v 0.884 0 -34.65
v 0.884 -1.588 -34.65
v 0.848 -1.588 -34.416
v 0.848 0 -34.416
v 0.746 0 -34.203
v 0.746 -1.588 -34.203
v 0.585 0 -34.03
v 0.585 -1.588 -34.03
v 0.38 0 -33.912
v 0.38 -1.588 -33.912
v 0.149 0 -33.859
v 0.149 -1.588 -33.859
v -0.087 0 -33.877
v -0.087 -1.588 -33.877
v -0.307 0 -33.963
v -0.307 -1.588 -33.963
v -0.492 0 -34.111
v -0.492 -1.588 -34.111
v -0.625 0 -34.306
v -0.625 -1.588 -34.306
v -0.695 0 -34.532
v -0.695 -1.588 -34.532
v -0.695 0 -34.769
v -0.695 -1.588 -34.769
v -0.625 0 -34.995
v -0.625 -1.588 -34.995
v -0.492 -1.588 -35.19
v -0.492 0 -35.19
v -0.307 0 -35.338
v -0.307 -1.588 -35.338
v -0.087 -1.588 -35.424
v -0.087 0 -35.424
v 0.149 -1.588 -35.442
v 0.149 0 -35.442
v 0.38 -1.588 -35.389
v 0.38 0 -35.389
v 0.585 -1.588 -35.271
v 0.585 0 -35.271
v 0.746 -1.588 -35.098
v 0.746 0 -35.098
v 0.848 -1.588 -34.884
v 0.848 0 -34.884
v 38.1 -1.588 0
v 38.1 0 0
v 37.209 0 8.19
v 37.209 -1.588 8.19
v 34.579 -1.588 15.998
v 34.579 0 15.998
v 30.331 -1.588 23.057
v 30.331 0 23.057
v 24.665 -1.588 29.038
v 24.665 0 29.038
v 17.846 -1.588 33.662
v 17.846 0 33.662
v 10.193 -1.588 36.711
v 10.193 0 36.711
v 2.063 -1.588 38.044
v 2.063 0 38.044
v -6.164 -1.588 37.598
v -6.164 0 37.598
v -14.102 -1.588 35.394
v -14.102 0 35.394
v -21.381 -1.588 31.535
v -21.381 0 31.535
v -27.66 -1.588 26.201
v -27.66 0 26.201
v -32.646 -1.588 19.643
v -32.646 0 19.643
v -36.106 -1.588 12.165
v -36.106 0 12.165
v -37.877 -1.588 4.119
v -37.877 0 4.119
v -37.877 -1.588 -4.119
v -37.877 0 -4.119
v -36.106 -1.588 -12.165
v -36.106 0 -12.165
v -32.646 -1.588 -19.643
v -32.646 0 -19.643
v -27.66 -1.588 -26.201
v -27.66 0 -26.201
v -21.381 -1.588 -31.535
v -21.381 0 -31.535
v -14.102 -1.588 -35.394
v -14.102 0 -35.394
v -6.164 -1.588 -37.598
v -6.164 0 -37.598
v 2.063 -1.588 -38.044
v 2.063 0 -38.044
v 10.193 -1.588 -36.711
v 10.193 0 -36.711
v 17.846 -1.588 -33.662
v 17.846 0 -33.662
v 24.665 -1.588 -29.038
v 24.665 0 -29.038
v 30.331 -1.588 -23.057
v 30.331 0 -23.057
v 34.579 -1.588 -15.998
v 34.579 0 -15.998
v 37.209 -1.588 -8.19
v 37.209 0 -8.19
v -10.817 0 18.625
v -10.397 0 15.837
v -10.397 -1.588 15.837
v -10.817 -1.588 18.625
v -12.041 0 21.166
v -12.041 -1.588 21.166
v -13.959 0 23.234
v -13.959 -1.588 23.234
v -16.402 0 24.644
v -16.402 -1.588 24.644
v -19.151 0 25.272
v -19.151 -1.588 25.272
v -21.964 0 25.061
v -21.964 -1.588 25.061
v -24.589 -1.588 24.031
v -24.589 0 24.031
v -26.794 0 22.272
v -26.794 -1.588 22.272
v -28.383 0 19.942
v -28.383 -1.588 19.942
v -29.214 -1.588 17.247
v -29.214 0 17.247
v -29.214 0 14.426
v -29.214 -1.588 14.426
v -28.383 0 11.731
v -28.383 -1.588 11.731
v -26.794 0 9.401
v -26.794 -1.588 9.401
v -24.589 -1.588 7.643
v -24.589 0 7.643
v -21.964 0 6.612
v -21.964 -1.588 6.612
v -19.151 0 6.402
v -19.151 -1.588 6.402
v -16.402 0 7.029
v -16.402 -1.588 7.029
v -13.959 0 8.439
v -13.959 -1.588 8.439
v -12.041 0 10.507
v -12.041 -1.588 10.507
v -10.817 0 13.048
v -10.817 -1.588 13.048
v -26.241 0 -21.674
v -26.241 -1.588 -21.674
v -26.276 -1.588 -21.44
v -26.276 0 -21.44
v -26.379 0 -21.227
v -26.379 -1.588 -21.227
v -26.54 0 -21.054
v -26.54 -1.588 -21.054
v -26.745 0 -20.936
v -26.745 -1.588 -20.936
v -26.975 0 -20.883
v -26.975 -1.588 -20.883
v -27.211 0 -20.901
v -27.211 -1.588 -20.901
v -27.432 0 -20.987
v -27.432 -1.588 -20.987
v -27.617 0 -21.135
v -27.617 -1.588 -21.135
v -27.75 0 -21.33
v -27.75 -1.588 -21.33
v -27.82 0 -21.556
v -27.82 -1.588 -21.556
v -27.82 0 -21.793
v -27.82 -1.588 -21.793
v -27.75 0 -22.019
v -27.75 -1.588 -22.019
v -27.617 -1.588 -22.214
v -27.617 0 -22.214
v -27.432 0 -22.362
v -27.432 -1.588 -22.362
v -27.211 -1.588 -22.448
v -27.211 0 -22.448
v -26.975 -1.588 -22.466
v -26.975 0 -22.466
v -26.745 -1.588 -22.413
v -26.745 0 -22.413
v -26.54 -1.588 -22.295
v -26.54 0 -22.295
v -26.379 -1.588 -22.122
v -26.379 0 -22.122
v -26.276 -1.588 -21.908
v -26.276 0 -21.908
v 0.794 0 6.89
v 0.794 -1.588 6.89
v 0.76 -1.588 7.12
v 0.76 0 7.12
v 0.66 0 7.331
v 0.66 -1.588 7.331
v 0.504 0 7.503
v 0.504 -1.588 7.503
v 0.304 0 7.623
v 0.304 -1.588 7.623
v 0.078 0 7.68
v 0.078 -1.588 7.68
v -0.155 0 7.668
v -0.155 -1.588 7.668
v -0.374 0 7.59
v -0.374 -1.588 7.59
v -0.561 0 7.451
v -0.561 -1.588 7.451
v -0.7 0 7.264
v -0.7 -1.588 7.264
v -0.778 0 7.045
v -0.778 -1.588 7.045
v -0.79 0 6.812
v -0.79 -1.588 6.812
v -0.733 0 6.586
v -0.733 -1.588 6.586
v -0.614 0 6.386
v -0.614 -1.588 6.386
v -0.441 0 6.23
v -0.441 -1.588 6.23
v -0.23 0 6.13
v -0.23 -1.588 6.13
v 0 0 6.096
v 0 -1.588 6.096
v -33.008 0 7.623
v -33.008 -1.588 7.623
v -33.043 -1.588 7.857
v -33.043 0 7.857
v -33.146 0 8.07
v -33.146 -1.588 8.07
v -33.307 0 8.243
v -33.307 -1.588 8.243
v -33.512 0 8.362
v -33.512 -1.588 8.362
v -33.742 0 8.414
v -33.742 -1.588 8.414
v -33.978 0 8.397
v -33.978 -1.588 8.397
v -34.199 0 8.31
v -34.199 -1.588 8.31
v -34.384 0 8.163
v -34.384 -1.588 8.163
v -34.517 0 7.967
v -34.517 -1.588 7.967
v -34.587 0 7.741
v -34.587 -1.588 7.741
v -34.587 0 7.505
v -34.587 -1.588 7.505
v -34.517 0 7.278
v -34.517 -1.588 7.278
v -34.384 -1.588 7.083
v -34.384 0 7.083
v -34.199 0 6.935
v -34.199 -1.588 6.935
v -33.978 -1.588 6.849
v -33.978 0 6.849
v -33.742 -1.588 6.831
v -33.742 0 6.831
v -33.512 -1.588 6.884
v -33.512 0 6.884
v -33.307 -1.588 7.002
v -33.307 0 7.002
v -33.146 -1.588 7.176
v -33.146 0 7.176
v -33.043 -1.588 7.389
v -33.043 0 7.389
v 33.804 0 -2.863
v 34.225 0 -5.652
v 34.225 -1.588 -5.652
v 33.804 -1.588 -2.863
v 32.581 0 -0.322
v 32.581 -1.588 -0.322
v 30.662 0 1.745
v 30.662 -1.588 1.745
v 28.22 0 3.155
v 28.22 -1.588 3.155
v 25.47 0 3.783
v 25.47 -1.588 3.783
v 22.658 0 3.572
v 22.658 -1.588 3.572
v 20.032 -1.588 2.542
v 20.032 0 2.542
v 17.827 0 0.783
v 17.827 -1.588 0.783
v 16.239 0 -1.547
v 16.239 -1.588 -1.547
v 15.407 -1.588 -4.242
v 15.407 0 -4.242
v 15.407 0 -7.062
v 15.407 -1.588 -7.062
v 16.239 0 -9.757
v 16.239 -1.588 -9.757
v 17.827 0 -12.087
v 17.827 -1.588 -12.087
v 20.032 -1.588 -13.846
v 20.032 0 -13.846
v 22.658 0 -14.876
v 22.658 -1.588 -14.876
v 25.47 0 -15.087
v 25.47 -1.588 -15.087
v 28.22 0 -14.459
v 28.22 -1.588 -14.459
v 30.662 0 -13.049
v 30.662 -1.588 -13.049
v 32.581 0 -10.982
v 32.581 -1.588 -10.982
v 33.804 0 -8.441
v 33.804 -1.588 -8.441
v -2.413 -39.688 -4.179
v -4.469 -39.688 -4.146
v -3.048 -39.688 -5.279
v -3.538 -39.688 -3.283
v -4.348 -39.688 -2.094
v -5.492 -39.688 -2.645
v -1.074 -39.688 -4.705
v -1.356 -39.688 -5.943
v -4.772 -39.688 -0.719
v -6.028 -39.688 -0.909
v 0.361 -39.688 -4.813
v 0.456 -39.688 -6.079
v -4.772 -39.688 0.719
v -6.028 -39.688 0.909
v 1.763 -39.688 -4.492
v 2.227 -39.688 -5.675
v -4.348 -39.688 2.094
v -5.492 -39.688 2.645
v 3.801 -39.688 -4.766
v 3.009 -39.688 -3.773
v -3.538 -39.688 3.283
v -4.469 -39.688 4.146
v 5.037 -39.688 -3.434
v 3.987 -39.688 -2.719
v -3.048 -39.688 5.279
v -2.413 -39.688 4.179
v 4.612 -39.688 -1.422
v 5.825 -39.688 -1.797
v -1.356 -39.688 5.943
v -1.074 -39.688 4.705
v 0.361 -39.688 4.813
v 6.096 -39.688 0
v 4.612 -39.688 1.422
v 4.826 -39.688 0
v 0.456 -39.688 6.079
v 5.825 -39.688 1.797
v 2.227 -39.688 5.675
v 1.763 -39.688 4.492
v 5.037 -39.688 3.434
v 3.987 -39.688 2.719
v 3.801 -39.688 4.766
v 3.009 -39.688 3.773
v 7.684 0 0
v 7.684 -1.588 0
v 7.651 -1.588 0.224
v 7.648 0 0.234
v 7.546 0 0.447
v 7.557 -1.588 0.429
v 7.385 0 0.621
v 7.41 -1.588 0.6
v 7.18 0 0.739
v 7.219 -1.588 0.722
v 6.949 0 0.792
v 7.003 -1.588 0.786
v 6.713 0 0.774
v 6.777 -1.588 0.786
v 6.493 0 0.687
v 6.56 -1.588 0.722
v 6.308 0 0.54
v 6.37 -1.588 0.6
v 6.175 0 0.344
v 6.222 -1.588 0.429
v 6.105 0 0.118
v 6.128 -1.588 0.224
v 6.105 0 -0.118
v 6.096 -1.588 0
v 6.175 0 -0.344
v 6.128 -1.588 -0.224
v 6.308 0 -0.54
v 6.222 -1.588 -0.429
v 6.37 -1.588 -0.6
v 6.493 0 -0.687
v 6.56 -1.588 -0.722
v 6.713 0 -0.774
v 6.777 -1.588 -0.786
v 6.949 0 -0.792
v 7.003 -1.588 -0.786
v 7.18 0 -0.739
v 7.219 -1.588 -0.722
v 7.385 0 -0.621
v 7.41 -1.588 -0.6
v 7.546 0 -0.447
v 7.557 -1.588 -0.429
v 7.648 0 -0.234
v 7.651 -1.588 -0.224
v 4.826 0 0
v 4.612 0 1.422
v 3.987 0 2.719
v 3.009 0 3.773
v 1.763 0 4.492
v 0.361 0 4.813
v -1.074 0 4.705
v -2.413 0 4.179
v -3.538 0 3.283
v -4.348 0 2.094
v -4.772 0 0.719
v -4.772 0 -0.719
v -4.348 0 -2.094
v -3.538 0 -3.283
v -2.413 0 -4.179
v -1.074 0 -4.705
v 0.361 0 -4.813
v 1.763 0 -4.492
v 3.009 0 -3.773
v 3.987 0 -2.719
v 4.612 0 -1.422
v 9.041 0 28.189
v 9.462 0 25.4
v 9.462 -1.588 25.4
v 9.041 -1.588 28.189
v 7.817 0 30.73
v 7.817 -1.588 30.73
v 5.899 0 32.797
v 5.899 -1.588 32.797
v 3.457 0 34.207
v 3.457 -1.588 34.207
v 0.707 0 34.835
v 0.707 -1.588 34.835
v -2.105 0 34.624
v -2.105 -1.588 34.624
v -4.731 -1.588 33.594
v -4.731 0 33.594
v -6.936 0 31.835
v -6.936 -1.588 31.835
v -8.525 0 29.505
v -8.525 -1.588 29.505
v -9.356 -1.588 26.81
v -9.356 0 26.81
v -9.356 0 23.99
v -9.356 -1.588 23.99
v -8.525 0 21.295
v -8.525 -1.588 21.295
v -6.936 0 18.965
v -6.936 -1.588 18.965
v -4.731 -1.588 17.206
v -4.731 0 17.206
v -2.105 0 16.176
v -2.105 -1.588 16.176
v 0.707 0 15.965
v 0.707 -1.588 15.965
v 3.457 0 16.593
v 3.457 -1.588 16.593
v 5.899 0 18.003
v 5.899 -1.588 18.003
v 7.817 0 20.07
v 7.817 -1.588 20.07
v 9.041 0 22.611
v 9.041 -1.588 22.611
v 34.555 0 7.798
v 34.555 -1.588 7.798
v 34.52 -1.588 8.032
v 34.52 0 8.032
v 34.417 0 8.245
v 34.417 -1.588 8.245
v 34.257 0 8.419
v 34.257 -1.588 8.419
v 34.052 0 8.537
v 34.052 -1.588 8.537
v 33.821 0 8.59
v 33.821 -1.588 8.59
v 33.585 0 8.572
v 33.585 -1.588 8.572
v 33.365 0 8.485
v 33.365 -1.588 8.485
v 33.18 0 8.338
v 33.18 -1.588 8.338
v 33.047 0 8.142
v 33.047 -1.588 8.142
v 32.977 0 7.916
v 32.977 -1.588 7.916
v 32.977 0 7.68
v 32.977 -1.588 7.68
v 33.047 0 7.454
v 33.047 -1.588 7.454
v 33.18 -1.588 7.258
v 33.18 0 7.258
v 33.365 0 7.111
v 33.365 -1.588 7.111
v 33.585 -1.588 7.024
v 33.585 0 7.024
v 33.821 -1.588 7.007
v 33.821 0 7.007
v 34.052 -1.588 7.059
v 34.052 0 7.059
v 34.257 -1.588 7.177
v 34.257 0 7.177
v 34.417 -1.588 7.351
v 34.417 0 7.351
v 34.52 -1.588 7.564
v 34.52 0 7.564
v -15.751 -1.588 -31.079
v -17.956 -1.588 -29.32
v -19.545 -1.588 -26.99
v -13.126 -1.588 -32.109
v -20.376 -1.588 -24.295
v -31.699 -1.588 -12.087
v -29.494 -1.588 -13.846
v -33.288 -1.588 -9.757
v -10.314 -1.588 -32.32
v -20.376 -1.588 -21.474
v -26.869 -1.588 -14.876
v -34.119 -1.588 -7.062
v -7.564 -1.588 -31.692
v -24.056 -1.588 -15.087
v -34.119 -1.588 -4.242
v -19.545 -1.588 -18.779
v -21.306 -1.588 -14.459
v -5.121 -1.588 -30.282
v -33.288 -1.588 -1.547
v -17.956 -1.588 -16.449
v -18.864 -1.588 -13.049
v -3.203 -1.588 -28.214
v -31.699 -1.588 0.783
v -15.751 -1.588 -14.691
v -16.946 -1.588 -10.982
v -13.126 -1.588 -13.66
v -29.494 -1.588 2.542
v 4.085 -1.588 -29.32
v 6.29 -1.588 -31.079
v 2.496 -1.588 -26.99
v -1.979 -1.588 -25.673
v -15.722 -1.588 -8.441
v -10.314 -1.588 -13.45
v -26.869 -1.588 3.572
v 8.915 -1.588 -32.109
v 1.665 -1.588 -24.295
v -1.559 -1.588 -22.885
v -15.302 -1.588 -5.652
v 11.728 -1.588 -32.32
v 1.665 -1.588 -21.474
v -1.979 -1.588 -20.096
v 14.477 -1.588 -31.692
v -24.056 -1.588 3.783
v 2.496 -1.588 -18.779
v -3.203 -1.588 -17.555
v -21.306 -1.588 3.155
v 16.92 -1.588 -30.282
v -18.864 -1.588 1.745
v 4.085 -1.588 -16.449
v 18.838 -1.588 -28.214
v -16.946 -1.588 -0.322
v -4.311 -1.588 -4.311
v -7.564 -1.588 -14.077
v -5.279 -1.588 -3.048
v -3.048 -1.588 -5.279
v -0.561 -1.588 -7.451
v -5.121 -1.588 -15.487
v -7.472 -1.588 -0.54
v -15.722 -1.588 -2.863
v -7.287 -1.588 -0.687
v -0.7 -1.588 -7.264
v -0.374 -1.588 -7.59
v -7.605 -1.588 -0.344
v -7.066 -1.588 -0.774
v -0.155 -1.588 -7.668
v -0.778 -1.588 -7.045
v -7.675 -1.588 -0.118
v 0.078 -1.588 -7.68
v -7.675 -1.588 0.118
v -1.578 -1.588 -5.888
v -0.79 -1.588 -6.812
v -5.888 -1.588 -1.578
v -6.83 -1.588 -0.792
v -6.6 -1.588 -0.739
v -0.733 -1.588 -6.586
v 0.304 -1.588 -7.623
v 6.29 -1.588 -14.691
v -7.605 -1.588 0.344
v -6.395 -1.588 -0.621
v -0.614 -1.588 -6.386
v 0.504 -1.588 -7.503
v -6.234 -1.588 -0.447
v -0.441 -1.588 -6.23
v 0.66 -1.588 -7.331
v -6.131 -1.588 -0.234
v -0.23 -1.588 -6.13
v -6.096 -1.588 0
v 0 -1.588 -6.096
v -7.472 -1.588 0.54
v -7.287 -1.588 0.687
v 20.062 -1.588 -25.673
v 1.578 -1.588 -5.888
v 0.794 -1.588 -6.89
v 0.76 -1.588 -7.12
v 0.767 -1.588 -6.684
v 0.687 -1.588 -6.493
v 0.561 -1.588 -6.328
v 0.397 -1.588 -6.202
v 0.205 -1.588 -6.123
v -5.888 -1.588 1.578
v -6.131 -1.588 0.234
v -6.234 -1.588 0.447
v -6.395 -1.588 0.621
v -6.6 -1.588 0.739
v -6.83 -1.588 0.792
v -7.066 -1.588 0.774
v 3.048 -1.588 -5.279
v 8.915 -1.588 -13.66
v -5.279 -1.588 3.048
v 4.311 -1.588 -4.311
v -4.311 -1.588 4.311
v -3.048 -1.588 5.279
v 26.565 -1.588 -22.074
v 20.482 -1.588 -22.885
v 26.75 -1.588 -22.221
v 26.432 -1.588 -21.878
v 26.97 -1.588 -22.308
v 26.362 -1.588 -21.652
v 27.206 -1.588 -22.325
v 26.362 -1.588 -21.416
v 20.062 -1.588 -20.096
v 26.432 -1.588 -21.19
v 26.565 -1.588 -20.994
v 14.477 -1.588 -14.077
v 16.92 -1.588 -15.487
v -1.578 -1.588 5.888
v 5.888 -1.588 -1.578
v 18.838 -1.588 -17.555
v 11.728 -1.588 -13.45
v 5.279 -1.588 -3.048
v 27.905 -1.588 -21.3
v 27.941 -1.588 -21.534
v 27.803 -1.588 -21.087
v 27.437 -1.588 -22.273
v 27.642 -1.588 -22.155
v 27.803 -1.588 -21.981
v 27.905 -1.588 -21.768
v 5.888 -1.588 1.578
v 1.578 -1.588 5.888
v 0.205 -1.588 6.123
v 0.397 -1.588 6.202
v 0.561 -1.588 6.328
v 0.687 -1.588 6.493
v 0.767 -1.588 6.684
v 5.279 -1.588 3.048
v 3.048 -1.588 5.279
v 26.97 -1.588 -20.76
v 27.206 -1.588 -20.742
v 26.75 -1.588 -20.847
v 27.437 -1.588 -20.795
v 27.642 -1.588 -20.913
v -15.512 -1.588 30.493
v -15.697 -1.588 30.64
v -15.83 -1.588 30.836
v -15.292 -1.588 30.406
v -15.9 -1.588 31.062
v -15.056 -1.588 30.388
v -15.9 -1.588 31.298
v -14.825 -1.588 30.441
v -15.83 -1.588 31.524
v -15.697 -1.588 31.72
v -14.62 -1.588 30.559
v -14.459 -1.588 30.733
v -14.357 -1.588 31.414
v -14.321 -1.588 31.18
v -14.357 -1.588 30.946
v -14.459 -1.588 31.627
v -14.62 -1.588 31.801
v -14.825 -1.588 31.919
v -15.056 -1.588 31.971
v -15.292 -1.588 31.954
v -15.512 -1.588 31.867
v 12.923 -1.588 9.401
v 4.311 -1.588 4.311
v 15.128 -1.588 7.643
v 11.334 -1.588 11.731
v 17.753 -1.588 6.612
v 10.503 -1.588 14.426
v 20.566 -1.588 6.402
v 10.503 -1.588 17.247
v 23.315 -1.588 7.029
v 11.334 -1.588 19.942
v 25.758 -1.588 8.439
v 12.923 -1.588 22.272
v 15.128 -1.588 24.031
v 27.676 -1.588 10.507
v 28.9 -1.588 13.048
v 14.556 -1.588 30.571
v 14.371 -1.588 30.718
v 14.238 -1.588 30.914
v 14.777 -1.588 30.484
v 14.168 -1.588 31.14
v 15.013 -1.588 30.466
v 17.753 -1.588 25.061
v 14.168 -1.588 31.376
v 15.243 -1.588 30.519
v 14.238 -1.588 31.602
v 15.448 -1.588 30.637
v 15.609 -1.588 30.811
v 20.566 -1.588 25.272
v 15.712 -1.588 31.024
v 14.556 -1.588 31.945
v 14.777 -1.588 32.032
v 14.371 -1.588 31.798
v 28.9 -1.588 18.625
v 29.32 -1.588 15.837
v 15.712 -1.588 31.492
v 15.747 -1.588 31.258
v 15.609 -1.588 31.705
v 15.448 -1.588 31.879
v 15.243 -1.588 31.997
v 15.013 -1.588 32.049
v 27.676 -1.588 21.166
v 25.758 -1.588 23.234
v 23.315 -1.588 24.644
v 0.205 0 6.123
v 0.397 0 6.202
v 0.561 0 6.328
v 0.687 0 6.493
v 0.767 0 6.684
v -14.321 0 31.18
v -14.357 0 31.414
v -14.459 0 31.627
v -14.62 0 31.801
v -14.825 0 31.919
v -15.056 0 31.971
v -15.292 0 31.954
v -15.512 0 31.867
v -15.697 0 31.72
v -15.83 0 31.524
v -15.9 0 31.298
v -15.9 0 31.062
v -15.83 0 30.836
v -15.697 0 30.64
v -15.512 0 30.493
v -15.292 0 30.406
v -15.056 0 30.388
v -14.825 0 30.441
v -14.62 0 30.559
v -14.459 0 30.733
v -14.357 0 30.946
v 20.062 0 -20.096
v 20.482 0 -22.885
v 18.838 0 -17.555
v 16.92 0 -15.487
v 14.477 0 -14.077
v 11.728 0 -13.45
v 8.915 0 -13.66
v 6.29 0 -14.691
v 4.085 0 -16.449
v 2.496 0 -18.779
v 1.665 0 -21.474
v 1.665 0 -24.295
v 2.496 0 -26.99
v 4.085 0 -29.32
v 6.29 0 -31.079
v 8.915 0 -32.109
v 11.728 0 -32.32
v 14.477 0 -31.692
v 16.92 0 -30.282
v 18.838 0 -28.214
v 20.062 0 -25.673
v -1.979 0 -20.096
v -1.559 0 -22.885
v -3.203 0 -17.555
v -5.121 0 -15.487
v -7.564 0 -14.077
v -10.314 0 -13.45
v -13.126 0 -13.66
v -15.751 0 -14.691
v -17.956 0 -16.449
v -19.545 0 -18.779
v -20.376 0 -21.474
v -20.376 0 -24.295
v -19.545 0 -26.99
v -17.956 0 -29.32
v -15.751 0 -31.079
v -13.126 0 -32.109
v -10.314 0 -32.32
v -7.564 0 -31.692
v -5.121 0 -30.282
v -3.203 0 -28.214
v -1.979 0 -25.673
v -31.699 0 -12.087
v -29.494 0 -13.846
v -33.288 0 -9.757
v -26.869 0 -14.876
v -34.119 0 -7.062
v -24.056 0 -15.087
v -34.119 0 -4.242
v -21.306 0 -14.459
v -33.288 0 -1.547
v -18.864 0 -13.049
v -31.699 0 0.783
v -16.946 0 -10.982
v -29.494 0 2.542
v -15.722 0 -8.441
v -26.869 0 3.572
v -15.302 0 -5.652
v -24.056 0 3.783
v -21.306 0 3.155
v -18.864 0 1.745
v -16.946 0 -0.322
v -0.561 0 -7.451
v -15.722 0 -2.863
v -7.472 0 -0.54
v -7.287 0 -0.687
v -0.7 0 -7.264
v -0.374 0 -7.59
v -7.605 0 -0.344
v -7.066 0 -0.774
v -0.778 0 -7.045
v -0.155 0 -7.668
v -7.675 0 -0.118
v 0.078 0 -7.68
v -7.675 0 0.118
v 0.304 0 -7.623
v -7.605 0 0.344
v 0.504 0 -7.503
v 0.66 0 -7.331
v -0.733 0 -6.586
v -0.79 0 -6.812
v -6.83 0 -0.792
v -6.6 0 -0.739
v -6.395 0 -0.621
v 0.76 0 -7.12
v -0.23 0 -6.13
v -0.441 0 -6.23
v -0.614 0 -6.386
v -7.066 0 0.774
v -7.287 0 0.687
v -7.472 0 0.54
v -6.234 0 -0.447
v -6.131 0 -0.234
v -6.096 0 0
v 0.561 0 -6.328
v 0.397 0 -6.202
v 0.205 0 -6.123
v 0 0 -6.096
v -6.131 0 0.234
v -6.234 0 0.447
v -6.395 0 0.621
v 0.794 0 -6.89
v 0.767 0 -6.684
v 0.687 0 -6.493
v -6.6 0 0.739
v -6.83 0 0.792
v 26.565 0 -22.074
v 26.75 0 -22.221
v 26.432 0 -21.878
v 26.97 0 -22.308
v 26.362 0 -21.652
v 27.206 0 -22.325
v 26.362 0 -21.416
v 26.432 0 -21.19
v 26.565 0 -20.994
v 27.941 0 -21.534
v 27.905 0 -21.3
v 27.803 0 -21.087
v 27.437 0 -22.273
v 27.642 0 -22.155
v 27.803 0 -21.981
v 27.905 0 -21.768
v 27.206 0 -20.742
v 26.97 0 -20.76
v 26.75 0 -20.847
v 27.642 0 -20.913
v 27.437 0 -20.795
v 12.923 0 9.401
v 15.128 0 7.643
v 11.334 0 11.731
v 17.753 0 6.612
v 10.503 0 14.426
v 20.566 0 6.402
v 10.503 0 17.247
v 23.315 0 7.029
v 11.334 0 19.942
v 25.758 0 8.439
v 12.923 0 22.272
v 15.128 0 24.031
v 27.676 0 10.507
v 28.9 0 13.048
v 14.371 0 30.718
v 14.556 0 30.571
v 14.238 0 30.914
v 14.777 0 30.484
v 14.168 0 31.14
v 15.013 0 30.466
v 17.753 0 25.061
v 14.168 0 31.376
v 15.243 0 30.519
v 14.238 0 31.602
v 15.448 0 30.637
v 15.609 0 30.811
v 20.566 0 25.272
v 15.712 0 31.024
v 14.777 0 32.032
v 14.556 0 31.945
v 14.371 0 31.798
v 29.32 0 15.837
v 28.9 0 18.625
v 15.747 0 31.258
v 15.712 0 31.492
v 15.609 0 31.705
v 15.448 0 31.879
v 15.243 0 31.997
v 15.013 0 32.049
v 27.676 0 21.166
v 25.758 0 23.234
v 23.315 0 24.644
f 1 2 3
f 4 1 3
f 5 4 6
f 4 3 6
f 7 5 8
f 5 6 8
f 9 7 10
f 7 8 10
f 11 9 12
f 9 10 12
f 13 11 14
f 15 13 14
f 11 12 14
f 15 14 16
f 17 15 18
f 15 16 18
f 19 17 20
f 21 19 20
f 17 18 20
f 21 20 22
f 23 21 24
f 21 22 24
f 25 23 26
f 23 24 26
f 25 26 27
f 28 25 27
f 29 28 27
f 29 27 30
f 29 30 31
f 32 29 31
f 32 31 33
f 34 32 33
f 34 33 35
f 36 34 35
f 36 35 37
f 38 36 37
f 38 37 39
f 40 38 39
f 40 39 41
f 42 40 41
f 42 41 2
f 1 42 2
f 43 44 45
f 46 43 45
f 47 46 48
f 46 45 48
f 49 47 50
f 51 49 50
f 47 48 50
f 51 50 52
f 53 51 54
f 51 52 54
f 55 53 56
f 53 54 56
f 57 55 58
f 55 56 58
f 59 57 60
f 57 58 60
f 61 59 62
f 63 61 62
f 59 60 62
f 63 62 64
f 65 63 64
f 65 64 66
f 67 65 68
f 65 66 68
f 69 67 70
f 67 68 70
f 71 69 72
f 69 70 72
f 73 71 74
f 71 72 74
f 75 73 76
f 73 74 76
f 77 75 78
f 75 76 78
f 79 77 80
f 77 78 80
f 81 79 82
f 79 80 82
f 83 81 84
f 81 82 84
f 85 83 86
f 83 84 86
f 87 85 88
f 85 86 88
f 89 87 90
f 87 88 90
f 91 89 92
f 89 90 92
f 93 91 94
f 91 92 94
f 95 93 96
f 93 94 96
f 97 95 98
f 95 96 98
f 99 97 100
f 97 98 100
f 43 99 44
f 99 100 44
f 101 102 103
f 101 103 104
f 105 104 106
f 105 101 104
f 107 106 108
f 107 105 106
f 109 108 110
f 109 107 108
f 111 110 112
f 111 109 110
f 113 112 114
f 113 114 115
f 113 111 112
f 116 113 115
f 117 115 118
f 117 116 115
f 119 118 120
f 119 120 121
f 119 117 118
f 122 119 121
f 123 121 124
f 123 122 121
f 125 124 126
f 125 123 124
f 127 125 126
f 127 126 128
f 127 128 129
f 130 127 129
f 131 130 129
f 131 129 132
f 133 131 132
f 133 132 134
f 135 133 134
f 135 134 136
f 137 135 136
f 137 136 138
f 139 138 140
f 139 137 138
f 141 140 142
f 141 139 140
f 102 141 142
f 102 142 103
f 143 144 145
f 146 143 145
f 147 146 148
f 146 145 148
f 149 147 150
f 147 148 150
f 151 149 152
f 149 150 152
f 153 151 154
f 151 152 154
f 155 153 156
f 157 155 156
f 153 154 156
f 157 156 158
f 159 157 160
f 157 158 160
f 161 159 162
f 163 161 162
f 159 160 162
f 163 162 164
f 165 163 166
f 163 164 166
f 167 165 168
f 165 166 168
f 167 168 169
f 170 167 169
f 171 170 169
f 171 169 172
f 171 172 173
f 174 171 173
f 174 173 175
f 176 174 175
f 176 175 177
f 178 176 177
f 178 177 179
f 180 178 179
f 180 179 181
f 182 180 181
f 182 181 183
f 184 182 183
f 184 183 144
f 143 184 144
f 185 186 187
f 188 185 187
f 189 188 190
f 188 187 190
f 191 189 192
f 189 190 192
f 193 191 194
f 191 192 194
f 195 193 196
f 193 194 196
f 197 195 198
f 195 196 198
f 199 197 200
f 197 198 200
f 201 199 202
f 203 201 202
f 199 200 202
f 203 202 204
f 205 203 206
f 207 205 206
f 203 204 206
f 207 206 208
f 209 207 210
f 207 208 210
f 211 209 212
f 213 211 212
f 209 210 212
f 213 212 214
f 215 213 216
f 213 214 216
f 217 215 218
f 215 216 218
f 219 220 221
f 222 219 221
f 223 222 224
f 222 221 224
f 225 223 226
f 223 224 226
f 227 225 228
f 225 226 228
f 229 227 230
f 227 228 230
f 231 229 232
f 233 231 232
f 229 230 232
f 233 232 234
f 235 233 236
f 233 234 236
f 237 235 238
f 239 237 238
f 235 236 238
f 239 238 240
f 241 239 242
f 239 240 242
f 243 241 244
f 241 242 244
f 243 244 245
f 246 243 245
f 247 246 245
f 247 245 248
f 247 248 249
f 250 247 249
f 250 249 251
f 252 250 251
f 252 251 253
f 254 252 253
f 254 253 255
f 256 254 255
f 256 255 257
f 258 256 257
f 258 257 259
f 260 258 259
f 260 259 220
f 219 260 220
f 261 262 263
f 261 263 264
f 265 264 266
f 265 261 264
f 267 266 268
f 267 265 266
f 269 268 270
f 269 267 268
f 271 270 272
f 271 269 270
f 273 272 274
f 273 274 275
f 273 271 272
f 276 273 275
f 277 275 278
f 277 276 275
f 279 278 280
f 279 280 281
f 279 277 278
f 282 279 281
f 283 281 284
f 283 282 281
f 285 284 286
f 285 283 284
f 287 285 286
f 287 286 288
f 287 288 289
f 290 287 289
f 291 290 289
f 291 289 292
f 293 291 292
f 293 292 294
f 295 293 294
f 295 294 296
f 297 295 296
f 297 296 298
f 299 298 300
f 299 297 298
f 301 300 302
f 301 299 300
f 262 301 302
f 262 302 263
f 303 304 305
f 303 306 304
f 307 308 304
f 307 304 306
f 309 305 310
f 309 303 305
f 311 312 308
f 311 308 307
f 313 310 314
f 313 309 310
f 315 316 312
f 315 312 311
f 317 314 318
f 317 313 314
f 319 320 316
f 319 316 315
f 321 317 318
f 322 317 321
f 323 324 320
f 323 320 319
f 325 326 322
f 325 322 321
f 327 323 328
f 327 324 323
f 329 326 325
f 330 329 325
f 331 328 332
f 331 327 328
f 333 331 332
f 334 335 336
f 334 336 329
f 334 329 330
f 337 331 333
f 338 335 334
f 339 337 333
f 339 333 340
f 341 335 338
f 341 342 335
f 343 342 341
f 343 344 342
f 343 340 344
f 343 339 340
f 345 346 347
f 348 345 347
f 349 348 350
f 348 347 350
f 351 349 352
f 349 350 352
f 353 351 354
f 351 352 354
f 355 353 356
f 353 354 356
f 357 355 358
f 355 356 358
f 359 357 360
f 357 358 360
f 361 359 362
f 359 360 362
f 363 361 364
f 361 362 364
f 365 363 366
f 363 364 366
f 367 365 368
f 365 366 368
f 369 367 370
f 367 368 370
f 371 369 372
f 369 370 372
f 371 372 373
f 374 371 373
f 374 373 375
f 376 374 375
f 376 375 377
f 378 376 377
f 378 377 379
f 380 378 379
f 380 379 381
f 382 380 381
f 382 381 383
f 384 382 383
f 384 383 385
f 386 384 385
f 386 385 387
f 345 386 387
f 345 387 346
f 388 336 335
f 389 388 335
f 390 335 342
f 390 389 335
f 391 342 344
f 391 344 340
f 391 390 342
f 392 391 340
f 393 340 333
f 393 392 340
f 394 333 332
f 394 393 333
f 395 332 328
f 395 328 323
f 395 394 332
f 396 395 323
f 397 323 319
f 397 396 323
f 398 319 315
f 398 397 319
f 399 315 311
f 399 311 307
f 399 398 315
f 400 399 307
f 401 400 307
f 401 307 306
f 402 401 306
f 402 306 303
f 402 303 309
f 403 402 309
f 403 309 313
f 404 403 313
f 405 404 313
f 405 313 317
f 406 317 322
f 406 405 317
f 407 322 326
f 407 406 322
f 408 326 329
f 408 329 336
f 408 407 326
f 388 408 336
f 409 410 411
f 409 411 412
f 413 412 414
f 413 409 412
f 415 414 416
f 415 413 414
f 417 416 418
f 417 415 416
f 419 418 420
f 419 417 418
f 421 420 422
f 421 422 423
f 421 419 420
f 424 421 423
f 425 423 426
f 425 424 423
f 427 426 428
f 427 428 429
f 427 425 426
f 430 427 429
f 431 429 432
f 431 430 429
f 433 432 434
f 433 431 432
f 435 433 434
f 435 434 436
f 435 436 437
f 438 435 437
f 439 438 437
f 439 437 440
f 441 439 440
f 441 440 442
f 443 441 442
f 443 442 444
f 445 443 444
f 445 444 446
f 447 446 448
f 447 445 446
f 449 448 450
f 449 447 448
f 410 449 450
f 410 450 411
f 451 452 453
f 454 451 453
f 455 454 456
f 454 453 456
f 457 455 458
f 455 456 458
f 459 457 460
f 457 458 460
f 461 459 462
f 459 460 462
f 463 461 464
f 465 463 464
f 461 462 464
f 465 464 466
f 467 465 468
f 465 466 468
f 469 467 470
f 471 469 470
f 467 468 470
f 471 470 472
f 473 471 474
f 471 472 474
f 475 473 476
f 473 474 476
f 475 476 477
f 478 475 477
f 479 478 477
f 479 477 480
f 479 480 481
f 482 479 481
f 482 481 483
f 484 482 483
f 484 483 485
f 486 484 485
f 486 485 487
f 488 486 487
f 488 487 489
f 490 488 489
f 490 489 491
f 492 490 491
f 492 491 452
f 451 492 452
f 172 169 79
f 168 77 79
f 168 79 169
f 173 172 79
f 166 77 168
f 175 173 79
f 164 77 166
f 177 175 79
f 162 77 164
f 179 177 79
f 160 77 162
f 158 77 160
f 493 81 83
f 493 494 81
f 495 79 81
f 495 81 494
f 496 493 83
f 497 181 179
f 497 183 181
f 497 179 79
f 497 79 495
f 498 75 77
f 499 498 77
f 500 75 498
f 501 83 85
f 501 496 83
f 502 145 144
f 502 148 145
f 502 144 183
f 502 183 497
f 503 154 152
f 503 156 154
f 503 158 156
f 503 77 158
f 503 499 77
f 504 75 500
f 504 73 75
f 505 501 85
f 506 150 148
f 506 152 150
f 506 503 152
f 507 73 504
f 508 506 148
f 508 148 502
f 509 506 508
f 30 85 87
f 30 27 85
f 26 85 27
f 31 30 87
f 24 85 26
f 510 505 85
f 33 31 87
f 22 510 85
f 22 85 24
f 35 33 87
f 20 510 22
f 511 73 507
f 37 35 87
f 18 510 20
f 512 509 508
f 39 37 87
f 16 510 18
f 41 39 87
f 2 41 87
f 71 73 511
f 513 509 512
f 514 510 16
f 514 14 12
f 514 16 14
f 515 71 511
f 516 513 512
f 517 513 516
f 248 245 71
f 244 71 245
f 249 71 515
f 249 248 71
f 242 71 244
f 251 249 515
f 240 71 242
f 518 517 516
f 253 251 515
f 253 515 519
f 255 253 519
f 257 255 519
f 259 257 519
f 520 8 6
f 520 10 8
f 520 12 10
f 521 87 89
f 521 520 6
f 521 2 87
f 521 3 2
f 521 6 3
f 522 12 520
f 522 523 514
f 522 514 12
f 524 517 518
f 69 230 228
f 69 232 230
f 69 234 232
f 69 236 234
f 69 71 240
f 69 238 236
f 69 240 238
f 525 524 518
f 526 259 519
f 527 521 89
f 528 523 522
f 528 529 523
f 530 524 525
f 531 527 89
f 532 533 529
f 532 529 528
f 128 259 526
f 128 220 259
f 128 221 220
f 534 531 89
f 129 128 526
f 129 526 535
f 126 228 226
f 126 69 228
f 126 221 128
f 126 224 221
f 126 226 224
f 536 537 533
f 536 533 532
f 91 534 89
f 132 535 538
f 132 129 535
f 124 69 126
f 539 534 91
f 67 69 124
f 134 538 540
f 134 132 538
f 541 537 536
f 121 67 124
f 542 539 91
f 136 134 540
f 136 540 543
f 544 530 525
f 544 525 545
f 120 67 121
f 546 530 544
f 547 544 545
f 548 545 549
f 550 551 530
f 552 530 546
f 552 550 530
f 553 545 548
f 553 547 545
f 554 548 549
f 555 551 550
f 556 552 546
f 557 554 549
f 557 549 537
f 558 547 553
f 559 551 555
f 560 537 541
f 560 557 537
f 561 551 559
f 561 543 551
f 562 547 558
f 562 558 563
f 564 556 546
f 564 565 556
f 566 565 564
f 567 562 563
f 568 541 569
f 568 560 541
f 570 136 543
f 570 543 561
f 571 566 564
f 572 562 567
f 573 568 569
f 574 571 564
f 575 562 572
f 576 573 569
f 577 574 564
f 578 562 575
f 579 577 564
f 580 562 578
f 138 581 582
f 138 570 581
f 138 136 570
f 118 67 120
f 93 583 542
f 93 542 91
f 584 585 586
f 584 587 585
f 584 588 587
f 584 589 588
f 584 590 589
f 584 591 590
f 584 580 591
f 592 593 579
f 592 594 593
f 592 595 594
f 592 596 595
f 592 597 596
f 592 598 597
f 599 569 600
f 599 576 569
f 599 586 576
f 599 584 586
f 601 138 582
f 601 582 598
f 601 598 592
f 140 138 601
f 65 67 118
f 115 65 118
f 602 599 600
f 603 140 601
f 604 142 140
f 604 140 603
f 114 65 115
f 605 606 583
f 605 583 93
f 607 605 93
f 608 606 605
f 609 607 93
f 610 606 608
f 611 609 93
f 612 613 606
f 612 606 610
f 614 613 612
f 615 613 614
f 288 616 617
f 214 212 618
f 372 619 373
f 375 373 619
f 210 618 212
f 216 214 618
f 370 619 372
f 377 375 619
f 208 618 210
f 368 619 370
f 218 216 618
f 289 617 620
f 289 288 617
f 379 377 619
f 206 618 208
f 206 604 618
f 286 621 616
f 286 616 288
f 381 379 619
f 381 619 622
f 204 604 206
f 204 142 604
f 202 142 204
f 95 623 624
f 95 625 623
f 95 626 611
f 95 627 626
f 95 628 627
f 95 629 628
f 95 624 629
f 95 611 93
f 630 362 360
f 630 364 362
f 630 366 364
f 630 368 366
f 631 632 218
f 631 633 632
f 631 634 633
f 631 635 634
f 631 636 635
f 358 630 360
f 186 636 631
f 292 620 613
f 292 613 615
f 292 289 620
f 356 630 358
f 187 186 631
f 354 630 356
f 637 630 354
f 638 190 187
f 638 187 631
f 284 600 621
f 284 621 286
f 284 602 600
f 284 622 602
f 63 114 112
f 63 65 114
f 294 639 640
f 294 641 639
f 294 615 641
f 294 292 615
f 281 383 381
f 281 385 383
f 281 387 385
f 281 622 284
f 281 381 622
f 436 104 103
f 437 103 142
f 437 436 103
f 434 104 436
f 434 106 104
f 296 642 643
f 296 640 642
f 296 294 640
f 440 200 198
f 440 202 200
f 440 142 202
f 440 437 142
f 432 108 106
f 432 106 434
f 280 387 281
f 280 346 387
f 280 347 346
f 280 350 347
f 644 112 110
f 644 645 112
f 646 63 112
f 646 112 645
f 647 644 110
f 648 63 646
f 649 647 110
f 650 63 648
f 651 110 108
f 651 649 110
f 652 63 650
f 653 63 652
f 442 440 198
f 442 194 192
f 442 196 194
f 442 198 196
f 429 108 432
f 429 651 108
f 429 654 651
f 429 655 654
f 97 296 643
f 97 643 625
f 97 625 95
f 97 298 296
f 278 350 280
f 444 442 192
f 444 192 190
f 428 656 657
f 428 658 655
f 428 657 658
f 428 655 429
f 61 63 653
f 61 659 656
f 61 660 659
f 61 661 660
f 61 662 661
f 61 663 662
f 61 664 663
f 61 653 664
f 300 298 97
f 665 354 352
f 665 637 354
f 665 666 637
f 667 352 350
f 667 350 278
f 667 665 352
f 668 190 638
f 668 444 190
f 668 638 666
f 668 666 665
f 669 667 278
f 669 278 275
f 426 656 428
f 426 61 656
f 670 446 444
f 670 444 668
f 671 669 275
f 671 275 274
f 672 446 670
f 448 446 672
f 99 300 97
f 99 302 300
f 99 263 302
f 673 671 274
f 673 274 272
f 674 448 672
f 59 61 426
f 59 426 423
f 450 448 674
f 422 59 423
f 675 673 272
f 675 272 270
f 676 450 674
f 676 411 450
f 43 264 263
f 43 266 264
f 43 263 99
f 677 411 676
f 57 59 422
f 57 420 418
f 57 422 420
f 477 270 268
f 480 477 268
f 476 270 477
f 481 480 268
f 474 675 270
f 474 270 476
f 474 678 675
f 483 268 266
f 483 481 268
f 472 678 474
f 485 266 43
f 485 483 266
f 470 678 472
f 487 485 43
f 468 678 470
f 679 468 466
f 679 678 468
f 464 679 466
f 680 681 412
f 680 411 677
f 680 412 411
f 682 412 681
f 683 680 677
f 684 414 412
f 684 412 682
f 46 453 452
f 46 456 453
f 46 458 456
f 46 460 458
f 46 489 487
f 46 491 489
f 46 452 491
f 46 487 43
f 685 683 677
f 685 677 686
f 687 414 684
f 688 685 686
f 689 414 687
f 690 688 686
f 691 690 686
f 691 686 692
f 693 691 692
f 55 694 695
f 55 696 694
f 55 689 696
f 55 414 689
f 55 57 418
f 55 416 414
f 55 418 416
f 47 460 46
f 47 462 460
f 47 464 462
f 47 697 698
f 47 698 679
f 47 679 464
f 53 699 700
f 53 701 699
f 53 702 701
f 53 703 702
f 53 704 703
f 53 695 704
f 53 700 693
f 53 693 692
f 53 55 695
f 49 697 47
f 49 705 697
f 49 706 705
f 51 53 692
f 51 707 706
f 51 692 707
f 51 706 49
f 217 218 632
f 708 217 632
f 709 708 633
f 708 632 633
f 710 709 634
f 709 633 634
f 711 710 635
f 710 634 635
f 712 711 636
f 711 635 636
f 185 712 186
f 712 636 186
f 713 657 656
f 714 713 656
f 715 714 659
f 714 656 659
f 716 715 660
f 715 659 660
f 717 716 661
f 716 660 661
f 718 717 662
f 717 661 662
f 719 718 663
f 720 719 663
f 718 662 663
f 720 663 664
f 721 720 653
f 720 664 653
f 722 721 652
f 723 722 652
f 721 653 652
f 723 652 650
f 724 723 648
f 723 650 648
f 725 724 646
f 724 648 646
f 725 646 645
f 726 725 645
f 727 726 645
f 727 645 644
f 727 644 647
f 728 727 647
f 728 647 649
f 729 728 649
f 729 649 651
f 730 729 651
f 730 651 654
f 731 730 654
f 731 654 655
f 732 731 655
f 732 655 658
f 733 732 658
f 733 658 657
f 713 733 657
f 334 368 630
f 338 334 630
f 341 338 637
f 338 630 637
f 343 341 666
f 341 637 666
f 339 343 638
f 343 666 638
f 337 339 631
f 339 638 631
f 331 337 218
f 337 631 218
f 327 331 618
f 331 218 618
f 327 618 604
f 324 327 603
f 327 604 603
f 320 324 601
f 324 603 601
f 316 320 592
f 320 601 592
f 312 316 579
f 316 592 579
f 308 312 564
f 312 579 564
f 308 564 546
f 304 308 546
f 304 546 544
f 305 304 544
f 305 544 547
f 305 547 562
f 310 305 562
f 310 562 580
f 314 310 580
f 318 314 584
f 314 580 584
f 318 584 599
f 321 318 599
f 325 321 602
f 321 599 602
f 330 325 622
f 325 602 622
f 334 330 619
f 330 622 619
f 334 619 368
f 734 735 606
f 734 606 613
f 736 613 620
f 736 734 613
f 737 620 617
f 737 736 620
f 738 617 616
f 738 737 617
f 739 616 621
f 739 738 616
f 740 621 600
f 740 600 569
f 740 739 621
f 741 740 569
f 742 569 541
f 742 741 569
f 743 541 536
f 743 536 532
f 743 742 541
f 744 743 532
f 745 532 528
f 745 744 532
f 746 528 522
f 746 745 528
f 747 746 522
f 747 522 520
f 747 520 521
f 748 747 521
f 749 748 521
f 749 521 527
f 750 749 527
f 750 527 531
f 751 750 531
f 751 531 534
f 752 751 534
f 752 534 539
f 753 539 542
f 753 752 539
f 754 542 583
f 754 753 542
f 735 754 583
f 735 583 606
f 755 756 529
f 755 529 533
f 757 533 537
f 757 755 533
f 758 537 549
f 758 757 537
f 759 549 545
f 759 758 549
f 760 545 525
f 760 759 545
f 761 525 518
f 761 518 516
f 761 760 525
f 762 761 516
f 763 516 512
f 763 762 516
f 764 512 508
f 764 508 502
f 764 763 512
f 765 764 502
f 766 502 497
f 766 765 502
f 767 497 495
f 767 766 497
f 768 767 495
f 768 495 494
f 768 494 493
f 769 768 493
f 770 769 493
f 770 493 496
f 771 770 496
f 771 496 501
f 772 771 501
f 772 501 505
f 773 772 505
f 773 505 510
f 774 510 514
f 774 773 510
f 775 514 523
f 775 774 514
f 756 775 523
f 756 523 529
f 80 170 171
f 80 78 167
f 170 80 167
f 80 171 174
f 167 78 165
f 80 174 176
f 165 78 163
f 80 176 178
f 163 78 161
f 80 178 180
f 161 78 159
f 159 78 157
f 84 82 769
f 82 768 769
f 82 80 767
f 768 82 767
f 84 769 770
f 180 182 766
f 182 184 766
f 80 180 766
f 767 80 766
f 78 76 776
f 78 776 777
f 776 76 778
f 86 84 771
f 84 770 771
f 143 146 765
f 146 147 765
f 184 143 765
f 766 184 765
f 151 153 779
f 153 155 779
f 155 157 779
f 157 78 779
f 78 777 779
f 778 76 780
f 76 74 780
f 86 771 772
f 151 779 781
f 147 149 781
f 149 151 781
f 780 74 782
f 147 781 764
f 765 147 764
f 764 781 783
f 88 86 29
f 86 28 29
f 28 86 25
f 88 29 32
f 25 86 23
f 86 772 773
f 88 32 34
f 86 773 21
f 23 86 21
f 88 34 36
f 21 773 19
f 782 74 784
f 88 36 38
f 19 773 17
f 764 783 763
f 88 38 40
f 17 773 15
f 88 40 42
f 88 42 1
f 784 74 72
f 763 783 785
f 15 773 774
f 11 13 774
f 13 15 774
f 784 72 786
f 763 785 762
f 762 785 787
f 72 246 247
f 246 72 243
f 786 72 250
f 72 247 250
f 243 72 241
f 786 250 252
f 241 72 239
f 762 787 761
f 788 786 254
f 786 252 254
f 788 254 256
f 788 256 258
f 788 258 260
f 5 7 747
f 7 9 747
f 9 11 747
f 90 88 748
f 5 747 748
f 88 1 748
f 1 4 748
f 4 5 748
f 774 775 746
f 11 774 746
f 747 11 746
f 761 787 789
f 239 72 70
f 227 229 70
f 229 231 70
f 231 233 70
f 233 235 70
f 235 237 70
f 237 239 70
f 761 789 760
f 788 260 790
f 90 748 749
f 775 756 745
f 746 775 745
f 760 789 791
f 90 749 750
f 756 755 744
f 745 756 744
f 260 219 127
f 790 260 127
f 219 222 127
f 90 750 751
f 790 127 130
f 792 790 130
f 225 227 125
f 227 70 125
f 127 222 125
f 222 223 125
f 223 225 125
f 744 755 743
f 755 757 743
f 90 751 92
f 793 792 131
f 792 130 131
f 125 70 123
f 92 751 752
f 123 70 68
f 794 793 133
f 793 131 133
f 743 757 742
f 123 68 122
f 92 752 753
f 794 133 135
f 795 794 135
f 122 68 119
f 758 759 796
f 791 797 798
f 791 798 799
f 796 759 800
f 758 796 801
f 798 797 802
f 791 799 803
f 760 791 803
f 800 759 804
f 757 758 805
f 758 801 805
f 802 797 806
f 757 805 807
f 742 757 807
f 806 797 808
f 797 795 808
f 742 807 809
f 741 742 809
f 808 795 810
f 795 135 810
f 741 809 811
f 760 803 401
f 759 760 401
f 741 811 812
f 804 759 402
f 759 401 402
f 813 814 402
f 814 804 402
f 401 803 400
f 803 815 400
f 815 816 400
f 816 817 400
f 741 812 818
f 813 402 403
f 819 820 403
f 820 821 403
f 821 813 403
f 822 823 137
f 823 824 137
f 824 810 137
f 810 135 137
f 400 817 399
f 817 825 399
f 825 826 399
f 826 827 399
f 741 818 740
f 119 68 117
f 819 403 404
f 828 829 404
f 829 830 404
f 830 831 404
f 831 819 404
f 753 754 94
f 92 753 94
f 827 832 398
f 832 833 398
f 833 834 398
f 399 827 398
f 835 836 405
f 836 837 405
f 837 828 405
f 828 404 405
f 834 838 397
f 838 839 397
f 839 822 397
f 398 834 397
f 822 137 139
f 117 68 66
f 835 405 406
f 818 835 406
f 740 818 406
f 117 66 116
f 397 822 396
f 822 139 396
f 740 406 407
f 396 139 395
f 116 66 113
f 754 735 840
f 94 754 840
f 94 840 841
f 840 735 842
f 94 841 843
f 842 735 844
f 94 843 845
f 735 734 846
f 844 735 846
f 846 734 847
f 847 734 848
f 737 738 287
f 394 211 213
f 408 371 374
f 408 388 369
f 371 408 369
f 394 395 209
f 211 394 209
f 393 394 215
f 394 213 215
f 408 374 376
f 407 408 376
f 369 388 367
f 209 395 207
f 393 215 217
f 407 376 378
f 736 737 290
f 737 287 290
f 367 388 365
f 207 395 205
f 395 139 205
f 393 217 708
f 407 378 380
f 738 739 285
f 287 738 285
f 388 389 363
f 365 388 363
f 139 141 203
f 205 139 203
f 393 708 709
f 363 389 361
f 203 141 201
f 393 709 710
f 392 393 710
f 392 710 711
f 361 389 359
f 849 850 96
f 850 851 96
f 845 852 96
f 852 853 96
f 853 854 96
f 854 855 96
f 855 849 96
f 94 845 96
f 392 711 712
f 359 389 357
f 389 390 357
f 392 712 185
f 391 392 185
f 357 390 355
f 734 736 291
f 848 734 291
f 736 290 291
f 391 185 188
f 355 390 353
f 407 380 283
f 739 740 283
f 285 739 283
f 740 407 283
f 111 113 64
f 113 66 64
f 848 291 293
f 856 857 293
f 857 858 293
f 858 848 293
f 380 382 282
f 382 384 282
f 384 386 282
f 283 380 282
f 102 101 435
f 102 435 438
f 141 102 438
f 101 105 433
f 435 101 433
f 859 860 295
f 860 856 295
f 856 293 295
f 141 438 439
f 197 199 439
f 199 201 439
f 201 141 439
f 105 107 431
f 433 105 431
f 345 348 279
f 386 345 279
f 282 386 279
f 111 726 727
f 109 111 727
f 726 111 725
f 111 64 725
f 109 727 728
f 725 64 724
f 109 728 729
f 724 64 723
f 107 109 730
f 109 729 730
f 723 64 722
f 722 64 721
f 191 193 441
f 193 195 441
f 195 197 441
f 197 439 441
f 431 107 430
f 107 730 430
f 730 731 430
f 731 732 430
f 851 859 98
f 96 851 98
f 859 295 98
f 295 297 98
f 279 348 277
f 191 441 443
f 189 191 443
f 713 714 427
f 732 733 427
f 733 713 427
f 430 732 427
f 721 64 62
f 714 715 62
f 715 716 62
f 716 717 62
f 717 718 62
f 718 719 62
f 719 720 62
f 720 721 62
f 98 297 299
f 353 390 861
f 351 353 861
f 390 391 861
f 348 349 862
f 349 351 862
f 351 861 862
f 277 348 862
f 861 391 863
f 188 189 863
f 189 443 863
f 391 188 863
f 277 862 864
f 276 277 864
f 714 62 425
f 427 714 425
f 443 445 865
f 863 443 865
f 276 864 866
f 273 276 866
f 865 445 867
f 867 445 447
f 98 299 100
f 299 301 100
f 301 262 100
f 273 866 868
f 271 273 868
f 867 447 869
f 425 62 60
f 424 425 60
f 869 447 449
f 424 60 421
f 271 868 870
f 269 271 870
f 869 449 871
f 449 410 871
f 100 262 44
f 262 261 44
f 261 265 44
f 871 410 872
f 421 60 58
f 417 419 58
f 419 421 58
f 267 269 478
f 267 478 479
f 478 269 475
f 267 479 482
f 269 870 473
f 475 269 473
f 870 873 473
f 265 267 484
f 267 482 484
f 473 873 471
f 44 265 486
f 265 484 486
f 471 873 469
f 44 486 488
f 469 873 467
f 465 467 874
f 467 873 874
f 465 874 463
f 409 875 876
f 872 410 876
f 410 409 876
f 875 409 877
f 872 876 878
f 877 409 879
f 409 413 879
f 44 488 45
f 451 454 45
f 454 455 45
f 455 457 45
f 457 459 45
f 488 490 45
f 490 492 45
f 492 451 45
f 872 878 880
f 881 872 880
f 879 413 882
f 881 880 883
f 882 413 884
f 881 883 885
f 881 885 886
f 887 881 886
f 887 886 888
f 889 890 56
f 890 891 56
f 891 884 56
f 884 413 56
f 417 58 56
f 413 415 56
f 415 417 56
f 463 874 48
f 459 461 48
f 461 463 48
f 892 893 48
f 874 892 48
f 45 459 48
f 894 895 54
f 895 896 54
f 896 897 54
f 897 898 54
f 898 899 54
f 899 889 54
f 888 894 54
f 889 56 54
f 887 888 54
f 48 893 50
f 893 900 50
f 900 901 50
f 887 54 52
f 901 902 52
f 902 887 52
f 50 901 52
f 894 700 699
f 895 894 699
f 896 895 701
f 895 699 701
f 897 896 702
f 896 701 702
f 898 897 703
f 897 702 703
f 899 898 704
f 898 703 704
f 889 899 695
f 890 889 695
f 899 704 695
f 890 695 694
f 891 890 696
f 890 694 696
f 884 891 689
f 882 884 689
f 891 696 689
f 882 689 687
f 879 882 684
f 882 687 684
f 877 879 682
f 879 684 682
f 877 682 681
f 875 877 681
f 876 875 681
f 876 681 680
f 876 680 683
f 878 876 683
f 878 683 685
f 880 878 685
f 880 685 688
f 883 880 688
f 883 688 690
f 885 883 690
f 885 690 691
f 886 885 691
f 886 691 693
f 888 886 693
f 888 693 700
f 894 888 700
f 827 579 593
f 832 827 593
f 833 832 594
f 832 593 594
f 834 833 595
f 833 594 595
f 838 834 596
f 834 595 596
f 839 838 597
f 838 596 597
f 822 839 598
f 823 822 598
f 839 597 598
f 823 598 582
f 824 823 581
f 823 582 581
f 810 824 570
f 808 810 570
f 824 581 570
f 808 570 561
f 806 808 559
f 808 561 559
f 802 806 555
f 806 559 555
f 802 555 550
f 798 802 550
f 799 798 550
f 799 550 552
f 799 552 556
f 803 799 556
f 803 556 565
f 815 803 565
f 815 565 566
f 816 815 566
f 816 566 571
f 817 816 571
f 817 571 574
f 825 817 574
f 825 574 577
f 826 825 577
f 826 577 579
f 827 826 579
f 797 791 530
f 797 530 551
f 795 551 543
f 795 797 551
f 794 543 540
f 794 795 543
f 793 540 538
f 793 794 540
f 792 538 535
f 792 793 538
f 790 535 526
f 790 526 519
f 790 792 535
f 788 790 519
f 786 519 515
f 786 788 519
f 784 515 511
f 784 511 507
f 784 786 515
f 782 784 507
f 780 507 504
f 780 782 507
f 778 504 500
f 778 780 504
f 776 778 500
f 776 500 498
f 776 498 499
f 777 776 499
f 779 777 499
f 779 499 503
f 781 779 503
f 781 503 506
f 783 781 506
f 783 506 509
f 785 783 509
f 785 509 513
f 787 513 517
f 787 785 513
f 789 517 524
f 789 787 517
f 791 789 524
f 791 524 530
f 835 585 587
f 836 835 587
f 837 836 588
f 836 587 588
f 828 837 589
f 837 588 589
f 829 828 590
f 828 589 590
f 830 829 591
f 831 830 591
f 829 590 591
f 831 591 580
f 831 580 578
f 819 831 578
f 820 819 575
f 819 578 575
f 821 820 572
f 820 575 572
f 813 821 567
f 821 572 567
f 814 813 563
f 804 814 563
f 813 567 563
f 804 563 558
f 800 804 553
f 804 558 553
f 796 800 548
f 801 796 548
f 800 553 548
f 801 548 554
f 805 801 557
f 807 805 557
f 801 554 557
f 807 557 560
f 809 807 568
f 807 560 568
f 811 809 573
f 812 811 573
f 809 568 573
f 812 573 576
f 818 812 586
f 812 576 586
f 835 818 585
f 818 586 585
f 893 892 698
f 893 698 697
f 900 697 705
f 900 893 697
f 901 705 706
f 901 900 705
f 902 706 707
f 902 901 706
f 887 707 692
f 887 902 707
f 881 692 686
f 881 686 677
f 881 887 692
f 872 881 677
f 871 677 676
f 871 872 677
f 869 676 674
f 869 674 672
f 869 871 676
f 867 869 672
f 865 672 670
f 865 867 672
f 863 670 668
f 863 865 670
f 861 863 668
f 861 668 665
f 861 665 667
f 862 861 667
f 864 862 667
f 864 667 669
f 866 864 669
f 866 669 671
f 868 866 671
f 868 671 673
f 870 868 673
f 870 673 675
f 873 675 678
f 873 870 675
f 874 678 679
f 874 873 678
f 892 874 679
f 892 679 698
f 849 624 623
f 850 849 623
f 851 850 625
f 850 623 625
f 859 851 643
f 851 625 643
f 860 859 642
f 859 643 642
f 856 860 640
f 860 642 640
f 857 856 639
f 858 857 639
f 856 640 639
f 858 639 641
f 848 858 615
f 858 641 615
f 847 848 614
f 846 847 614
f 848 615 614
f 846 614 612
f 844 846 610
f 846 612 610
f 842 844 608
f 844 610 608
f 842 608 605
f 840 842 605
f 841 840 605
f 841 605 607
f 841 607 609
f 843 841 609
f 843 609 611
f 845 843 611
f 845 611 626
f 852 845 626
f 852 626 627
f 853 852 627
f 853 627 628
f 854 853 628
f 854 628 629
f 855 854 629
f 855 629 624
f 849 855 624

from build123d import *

# Parameters (mm, degrees)
F0_R     = 38.1
F0_R_2   = 9.4615
F0_R_3   = 4.826
F1_DEPTH = 1.5875
F2_R     = 6.096
F2_R_2   = 4.826
F3_DEPTH = 38.1
F4_R     = 0.79375
F5_DEPTH = 282.448


with BuildPart() as f1:
    # F0 (on Front) → F1 (new body)
    with BuildSketch(Plane.XZ):
        Circle(F0_R)
        with Locations((-11.020647, -22.884609)):
            Circle(F0_R_2, mode=Mode.SUBTRACT)
        with Locations((-24.763169, -5.652032)):
            Circle(F0_R_2, mode=Mode.SUBTRACT)
        with Locations((11.020647, -22.884609)):
            Circle(F0_R_2, mode=Mode.SUBTRACT)
        with Locations((24.763169, -5.652032)):
            Circle(F0_R_2, mode=Mode.SUBTRACT)
        with Locations((-19.85852, 15.836641)):
            Circle(F0_R_2, mode=Mode.SUBTRACT)
        Circle(F0_R_3, mode=Mode.SUBTRACT)
        with Locations((19.85852, 15.836641)):
            Circle(F0_R_2, mode=Mode.SUBTRACT)
        with Locations((0, 25.4)):
            Circle(F0_R_2, mode=Mode.SUBTRACT)
    extrude(amount=F1_DEPTH)

    # F2 (on face) → F3 (join)
    with BuildSketch(Plane.XZ.offset(1.5875)):
        Circle(F2_R)
        Circle(F2_R_2, mode=Mode.SUBTRACT)
    extrude(amount=F3_DEPTH)

    # F4 (on face) → F5 (cut)
    with BuildSketch(Plane.XZ.offset(1.5875)):
        with BuildLine():
            ThreePointArc((0.79375, -6.88975), (0.561266, -6.328484), (0, -6.096))
            ThreePointArc((0, -6.096), (-0.561266, -7.451016), (0.79375, -6.88975))
        make_face()
        with BuildLine():
            ThreePointArc((6.096, 0), (6.88975, -0.79375), (7.6835, 0))
            ThreePointArc((7.6835, 0), (6.88975, 0.79375), (6.096, 0))
        make_face()
        with Locations((27.146798, -21.533931)):
            Circle(F4_R)
        with Locations((33.761657, 7.798035)):
            Circle(F4_R)
        with Locations((0.089846, -34.650408)):
            Circle(F4_R)
        with Locations((-27.034762, -21.674421)):
            Circle(F4_R)
        with Locations((-33.801643, 7.622847)):
            Circle(F4_R)
        with Locations((-15.115198, 31.179956)):
            Circle(F4_R)
        with Locations((14.9533, 31.257922)):
            Circle(F4_R)
        with BuildLine():
            ThreePointArc((0.79375, 6.88975), (-0.561266, 7.451016), (0, 6.096))
            ThreePointArc((0, 6.096), (0.561266, 6.328484), (0.79375, 6.88975))
        make_face()
        with Locations((-6.88975, 0)):
            Circle(F4_R)
    extrude(amount=-F5_DEPTH, mode=Mode.SUBTRACT)


solid = f1.part
